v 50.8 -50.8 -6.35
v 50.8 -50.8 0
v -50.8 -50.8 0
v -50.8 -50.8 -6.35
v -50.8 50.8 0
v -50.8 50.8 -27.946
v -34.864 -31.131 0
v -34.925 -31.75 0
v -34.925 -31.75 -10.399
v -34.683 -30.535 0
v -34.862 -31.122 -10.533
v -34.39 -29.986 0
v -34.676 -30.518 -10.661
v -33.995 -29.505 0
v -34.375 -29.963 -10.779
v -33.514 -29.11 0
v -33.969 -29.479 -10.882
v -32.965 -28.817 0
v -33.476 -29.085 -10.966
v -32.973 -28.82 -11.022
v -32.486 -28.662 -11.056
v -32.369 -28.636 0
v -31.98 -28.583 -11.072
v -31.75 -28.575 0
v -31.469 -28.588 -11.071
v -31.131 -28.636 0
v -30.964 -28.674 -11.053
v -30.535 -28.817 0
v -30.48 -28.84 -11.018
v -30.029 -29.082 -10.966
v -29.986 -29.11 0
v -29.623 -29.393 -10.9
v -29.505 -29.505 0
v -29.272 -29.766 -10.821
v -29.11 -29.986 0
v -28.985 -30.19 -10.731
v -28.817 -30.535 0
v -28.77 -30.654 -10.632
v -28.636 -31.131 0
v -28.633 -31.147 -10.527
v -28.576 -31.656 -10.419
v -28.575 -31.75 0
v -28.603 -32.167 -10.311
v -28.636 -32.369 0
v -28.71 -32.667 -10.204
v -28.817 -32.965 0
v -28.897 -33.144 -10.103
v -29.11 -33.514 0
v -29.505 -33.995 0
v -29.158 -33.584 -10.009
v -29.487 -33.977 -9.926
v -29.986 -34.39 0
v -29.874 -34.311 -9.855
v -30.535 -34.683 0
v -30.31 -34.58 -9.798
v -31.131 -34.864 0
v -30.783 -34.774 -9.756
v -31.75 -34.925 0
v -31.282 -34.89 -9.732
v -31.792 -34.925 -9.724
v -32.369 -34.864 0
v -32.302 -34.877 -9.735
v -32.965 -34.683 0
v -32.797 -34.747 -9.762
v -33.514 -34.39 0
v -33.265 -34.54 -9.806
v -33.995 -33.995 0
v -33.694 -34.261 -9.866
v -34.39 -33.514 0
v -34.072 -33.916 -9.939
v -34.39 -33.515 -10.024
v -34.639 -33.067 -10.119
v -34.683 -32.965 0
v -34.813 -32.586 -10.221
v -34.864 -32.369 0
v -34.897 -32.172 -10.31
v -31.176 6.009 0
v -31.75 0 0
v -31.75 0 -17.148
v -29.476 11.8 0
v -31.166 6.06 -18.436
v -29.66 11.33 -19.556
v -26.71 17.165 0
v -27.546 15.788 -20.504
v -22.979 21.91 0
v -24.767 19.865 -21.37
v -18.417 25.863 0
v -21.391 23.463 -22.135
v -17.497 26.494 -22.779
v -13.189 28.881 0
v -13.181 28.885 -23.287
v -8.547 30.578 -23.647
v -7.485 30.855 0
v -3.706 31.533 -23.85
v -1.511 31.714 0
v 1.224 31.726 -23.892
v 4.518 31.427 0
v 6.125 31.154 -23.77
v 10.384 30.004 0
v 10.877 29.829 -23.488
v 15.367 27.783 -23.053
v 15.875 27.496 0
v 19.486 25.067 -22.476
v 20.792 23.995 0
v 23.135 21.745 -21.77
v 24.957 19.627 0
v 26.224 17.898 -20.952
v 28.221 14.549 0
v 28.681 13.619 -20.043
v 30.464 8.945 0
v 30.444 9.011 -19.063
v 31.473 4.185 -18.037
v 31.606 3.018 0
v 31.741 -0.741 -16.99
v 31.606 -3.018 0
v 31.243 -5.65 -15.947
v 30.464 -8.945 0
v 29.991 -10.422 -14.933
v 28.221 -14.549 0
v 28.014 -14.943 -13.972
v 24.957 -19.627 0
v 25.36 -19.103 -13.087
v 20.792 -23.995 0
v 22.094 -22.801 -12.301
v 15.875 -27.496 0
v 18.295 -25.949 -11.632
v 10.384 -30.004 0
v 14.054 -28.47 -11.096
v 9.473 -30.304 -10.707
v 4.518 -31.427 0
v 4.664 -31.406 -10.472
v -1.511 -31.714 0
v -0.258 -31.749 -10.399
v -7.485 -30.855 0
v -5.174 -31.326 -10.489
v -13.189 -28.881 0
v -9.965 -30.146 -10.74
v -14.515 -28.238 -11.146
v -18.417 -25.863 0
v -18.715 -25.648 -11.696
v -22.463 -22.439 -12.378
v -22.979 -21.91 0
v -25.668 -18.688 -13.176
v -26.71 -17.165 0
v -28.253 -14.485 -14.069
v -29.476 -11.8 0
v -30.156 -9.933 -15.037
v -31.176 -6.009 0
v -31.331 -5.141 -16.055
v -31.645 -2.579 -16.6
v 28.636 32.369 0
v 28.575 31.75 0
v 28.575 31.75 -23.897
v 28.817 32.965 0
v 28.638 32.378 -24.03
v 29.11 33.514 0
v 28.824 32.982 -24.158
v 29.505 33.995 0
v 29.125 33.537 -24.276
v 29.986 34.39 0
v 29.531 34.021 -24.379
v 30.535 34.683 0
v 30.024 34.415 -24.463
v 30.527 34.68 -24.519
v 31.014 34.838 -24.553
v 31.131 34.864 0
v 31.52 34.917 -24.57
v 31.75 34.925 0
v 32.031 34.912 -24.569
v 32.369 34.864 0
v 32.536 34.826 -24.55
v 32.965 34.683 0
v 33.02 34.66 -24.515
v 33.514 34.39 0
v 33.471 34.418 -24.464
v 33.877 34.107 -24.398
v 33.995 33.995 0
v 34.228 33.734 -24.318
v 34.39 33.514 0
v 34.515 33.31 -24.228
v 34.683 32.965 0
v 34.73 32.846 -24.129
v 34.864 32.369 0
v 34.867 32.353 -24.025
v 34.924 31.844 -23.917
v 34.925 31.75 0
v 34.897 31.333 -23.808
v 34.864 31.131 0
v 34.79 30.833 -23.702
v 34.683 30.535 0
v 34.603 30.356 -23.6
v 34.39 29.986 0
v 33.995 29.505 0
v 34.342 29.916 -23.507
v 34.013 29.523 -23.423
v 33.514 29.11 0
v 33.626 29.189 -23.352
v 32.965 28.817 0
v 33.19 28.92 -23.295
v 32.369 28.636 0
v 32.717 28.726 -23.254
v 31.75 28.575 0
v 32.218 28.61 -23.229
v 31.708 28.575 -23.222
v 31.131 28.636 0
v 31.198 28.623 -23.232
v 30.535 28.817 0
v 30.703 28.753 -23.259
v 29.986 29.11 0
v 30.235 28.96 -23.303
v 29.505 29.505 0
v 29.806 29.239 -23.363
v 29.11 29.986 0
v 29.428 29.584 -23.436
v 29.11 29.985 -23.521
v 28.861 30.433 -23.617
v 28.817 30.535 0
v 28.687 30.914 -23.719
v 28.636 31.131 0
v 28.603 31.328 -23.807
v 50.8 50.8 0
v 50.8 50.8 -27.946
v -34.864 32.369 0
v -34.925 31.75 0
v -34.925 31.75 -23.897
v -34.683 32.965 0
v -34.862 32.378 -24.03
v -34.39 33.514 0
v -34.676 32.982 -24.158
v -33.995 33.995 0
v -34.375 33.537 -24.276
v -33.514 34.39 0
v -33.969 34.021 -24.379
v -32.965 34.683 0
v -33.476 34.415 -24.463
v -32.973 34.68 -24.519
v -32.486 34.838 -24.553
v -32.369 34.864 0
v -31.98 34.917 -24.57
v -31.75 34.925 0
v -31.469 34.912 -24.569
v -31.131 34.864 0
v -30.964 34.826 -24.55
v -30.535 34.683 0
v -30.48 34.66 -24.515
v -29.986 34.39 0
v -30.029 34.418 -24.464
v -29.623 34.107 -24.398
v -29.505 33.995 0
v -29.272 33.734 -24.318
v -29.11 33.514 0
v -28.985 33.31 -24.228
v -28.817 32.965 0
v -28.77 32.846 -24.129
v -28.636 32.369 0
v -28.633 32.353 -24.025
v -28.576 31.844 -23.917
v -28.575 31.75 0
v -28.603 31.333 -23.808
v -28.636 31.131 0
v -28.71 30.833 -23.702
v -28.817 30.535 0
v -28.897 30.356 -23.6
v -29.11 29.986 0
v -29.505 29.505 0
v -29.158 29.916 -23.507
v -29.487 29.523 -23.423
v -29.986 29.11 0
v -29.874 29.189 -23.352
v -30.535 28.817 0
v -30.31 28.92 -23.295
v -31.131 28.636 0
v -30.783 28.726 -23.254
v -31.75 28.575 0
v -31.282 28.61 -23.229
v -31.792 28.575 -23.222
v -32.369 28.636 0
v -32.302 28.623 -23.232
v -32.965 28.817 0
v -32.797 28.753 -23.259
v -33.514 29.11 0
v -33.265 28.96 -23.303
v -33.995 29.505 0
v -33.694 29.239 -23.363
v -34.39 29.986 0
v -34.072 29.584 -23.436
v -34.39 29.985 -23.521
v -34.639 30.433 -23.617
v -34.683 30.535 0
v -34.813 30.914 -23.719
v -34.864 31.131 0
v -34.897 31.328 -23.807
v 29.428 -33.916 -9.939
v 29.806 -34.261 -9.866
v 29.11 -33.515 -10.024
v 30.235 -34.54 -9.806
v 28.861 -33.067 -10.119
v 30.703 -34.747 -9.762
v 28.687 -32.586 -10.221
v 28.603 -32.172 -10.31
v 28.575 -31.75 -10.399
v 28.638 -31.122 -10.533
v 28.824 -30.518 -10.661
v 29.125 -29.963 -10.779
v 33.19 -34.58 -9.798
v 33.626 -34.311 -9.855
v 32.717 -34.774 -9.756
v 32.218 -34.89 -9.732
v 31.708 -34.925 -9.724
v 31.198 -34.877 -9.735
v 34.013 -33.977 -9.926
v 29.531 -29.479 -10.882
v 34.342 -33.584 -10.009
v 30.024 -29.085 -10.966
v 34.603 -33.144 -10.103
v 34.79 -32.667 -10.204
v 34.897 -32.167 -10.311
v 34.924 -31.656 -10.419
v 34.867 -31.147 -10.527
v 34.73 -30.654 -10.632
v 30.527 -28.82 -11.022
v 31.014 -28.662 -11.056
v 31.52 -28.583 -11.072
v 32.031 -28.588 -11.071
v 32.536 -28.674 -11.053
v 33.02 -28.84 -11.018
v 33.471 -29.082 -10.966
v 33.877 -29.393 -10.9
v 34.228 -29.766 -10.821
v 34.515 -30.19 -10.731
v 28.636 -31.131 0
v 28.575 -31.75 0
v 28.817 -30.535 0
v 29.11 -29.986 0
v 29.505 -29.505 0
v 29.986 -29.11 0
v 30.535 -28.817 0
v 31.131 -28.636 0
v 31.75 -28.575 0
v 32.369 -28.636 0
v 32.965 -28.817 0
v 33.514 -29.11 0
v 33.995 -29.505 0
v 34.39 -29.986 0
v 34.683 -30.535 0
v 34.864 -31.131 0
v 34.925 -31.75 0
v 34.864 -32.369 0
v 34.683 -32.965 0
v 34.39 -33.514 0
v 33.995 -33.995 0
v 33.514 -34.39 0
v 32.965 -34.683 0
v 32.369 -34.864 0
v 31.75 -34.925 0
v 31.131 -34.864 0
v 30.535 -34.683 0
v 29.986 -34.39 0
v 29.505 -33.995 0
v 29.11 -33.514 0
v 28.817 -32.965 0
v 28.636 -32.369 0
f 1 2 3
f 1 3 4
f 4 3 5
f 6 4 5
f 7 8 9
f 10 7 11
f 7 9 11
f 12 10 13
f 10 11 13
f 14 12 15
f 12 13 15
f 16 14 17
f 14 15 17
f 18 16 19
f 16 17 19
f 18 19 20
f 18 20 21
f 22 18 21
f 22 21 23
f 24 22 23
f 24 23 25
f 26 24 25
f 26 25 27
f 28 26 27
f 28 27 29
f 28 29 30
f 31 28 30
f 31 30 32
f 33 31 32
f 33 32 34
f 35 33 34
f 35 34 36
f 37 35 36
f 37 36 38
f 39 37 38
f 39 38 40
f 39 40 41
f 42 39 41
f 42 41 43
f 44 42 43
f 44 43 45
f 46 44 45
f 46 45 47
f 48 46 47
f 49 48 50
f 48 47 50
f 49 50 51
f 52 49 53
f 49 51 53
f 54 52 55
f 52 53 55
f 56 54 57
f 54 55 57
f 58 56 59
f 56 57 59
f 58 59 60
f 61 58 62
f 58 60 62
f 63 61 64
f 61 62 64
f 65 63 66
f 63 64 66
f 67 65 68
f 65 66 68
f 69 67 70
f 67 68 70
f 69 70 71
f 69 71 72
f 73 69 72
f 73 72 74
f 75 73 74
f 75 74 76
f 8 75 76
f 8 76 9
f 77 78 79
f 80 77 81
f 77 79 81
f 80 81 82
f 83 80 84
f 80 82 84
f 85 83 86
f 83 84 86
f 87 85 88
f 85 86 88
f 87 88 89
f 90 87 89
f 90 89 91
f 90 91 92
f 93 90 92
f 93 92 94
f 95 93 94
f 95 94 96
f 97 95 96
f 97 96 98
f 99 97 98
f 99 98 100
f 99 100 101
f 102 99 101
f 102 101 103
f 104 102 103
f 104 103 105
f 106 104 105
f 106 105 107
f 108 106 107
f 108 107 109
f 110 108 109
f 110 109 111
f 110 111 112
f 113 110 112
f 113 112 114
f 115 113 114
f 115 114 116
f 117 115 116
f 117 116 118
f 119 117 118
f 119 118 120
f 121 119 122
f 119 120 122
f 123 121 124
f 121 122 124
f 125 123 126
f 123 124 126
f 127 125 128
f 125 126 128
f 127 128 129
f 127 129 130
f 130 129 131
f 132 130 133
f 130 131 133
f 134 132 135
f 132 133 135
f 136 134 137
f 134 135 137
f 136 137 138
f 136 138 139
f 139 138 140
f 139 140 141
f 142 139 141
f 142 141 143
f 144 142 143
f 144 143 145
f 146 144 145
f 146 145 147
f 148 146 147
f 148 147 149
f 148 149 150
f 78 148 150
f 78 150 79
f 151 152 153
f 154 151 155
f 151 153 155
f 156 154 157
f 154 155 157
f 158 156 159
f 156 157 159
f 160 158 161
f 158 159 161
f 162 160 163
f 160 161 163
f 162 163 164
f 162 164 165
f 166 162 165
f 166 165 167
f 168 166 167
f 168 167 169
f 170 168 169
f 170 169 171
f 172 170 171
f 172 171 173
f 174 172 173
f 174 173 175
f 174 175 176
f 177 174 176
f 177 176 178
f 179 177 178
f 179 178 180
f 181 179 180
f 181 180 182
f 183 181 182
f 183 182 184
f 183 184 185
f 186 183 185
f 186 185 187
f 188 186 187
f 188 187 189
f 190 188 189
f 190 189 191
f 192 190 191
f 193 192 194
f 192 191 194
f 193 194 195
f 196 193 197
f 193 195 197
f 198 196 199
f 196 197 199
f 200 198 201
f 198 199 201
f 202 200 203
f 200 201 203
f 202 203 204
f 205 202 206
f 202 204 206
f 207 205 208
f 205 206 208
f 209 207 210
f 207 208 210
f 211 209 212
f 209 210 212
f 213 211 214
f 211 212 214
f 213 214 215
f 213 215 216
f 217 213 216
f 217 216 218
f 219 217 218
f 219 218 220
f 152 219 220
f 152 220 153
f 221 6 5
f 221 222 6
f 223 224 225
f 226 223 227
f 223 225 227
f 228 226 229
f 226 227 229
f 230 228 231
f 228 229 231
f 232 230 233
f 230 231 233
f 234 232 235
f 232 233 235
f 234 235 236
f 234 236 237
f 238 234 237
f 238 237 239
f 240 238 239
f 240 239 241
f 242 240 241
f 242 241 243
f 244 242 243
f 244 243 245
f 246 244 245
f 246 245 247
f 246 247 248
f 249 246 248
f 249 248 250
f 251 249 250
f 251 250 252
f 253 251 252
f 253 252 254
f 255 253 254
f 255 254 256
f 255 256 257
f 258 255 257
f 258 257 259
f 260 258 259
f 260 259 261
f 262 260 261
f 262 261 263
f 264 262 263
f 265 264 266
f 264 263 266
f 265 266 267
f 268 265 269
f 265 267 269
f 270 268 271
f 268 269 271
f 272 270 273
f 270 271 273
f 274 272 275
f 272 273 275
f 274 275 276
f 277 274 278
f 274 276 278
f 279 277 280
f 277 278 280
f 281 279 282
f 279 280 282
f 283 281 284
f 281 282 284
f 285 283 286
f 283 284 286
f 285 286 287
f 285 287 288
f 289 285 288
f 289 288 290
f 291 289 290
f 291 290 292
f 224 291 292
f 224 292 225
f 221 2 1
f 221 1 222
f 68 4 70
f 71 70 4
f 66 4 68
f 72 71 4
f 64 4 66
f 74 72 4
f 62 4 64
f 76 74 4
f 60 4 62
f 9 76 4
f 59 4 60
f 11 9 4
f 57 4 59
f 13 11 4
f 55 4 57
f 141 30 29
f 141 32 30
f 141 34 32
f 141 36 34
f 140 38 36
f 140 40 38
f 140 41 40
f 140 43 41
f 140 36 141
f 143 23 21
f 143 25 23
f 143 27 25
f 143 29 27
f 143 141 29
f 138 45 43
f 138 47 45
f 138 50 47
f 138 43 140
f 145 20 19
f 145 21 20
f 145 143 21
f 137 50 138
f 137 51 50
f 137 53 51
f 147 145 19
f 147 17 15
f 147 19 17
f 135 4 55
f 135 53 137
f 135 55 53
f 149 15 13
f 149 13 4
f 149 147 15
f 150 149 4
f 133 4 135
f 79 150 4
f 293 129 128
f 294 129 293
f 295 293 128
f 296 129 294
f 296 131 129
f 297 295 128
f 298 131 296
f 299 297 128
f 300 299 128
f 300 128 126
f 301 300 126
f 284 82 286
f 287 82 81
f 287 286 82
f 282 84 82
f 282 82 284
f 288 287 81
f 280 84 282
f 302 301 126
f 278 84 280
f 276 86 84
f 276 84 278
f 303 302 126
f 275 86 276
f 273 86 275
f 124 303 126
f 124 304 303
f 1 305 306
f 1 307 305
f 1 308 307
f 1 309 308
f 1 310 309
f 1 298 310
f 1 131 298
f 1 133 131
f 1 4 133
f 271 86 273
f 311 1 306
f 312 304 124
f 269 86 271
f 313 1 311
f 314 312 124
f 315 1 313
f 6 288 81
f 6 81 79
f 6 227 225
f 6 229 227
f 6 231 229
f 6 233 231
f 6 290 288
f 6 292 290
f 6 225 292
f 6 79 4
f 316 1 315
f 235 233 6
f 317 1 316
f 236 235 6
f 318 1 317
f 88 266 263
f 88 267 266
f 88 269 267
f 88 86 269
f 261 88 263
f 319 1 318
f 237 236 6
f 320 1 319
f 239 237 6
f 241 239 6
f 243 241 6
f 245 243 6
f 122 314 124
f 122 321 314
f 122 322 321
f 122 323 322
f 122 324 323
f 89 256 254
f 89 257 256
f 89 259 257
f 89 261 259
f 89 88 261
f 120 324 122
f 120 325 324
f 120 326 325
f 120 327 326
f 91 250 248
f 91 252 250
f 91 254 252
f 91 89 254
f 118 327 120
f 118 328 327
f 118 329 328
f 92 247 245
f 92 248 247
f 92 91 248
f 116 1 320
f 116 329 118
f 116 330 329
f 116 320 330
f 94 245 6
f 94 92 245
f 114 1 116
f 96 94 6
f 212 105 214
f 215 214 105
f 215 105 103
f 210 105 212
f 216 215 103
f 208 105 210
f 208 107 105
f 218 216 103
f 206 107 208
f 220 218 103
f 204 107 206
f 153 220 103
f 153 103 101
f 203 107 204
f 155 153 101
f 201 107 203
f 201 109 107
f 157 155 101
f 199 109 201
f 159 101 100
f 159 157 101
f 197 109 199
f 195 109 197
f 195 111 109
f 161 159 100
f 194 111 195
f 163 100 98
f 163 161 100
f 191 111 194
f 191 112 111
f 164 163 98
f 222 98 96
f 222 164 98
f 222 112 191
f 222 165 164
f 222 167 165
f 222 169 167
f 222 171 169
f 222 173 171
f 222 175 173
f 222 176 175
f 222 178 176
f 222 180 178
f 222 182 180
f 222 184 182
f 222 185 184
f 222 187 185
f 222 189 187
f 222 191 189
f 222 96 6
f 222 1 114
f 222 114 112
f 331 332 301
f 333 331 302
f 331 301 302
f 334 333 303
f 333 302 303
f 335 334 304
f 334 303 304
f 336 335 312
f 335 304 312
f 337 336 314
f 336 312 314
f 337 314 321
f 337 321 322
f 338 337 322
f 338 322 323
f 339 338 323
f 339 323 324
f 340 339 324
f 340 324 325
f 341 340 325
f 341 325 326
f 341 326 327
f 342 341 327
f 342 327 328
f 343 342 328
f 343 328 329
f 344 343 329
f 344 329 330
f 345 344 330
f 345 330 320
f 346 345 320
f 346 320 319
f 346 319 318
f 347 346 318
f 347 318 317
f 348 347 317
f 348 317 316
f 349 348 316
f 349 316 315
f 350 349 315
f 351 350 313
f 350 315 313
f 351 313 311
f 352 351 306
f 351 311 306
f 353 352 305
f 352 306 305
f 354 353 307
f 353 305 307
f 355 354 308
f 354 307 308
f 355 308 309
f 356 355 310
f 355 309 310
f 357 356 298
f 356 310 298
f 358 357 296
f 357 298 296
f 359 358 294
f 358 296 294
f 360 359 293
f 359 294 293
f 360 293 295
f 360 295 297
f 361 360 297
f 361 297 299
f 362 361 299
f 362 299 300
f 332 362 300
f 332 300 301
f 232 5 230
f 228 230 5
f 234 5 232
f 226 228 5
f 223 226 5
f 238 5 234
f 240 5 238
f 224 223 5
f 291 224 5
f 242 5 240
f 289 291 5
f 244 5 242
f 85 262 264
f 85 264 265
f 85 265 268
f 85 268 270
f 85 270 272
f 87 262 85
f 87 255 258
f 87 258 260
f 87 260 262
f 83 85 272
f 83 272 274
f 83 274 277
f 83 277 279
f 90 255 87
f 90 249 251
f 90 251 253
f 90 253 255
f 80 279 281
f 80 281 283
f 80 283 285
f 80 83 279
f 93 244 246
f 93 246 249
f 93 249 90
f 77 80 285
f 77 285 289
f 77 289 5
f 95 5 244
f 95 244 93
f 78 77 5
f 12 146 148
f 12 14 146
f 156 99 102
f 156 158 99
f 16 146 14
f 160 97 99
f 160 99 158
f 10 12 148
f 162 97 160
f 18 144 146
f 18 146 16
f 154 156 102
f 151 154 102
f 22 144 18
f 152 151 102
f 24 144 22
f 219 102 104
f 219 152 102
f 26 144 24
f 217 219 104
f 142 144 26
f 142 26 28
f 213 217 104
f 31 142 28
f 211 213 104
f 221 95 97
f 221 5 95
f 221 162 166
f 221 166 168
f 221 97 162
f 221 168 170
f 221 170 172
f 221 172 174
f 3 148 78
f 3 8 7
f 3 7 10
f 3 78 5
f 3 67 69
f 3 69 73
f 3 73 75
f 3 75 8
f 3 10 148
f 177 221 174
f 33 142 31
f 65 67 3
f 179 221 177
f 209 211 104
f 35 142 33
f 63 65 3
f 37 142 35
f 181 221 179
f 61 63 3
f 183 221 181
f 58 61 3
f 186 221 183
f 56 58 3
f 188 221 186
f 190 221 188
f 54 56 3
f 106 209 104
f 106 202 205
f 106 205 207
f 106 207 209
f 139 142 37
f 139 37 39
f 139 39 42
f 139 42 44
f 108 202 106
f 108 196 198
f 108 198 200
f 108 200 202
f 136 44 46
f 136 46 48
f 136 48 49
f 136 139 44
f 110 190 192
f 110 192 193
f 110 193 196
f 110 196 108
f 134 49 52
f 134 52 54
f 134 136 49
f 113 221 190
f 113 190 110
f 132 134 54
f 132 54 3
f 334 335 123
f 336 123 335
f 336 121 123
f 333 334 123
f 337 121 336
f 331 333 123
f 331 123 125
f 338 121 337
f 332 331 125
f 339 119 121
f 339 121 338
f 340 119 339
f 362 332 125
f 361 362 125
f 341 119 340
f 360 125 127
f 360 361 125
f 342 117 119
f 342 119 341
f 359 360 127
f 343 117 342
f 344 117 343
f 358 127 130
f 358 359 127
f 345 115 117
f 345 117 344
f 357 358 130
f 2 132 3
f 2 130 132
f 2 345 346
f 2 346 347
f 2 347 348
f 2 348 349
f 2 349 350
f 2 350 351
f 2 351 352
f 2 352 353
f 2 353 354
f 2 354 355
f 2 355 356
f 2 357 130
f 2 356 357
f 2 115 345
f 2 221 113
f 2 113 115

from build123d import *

# Parameters (mm, degrees)
F2_DEPTH      = 50.8
F2_DEPTH_BACK = 50.8
F3_D          = 6.35
F5_D          = 63.5


with BuildPart() as f2:
    # F1 (on Right) → F2 (new body, two sides)
    with BuildSketch(Plane.YZ) as f2_sk:
        Polygon((50.8, 0), (-50.8, 0), (-50.8, -6.35), (50.8, -27.945747), align=None)
    extrude(amount=F2_DEPTH)
    extrude(f2_sk.sketch, amount=-F2_DEPTH_BACK)

    # F3 (through all)
    with Locations(Plane.XY):
        with Locations((-31.75, 31.75), (31.75, 31.75), (31.75, -31.75), (-31.75, -31.75)):
            Hole(F3_D / 2)

    # F5 (through all)
    with Locations(Plane.XY):
        with Locations((0, 0)):
            Hole(F5_D / 2)


solid = f2.part
